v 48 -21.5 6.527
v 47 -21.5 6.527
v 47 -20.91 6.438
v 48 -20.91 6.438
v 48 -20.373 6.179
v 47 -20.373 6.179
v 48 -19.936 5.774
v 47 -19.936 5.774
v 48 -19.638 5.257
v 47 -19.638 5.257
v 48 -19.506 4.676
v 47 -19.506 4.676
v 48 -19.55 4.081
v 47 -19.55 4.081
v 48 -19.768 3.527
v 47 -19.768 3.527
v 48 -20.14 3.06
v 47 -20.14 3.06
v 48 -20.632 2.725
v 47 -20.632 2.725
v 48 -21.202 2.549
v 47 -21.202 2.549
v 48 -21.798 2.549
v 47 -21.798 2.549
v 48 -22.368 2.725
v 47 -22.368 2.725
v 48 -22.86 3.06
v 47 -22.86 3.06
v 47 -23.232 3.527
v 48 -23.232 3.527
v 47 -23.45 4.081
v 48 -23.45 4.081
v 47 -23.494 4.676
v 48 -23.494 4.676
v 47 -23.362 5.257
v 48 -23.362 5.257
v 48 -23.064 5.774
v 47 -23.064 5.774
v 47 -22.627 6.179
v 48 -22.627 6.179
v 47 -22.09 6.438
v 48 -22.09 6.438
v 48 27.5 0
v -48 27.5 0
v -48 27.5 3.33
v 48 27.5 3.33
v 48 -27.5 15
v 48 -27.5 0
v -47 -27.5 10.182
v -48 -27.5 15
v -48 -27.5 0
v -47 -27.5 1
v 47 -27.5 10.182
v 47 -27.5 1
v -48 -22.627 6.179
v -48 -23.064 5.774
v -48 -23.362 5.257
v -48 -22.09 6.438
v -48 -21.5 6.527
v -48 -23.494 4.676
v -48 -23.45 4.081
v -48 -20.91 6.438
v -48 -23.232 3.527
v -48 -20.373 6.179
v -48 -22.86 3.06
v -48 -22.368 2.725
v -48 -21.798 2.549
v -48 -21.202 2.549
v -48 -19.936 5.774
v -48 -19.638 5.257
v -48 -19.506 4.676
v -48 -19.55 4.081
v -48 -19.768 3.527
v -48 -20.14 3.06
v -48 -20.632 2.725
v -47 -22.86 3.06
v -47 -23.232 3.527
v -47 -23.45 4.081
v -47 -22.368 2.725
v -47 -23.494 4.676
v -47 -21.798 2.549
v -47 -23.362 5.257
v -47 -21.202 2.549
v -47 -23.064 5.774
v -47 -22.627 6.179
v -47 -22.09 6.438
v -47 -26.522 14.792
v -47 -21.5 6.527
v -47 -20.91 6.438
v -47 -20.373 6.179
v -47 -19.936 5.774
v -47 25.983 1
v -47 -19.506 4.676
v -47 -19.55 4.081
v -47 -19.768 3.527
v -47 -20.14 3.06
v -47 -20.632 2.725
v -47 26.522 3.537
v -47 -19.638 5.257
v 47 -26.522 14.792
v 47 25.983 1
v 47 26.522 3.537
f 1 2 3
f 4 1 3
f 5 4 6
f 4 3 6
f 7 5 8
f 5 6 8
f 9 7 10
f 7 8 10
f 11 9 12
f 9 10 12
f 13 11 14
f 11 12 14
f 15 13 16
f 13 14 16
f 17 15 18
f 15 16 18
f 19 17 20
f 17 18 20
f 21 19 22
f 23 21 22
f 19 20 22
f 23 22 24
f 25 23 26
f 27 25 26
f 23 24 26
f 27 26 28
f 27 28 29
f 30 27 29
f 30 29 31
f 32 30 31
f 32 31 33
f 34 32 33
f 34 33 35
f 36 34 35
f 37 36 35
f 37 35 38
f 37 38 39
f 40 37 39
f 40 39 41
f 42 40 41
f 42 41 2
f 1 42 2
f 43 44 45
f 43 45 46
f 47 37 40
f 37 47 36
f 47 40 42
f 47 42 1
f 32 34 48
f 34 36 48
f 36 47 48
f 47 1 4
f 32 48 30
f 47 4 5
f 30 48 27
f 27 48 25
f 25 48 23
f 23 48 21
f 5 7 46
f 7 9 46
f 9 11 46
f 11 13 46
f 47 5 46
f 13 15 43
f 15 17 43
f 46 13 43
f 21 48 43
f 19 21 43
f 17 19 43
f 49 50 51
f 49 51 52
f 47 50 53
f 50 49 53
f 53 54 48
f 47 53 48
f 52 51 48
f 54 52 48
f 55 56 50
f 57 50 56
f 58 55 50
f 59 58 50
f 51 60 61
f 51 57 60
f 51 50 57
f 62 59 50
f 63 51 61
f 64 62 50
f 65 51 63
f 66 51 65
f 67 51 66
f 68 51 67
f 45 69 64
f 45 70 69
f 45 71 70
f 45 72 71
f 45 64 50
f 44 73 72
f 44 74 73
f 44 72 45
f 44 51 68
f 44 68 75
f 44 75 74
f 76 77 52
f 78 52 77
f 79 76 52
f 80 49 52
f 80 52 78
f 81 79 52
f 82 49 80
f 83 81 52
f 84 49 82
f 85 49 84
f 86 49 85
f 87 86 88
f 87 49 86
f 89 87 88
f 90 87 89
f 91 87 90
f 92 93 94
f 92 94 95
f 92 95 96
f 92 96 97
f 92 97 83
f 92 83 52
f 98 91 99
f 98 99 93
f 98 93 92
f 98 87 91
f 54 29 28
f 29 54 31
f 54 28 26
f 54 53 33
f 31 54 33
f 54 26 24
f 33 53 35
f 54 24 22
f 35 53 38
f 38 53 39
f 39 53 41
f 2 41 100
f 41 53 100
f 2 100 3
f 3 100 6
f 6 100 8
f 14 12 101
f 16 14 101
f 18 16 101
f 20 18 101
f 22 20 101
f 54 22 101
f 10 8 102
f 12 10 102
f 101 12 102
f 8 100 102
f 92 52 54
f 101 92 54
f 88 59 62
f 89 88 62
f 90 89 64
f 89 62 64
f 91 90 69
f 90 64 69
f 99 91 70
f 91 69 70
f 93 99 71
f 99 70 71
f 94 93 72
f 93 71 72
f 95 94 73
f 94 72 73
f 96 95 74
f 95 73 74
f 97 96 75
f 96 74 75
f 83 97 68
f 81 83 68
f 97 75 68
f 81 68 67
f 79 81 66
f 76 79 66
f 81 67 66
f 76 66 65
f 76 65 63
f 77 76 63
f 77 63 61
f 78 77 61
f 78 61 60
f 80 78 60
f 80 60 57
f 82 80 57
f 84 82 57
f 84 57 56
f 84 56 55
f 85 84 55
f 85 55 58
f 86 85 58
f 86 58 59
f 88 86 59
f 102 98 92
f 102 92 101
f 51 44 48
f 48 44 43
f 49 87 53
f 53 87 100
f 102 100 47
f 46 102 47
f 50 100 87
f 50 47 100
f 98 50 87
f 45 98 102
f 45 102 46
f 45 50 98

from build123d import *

# Parameters (mm, degrees)
CROQUIS1_W                          = 96
CROQUIS1_H                          = 55
SALIENTE_EXTRUIR2_DEPTH             = 15
CORTAR_EXTRUIR1_DEPTH               = 96
CORTAR_EXTRUIR6_REACH               = 17.673
CORTAR_EXTRUIR6_OFFSET_FROM_SURFACE = 1
CROQUIS4_W                          = 94
CROQUIS4_H                          = 54.224485051
CROQUIS5_R                          = 2
CORTAR_EXTRUIR7_DEPTH               = 97


with BuildPart() as part:
    # Croquis1 → Saliente-Extruir2 (new body)
    with BuildSketch(Plane.XY):
        Rectangle(CROQUIS1_W, CROQUIS1_H)
    extrude(amount=SALIENTE_EXTRUIR2_DEPTH)

    # Croquis2 → Cortar-Extruir1 (cut)
    with BuildSketch(Plane.ZY.offset(48)):
        Polygon((3.329836367, 27.5), (15, 27.5), (15, -27.5), align=None)
    extrude(amount=-CORTAR_EXTRUIR1_DEPTH, mode=Mode.SUBTRACT)

    # Cortar-Extruir6: up to this face of the body (flat: up to its plane, moved by the offset)
    cortar_extruir6_end = Plane(part.part.faces().sort_by_distance((0, 0, 0))[0]).offset(-CORTAR_EXTRUIR6_OFFSET_FROM_SURFACE)
    # Croquis4 → Cortar-Extruir6 (cut, up to the picked face)
    with BuildSketch(Plane(origin=(0, 1.860875227, 8.770068758), x_dir=(1, 0, 0), z_dir=(0, 0.207563726, 0.978221498)), mode=Mode.PRIVATE) as cortar_extruir6_sk1:
        with Locations((0, -1.902304571)):
            Rectangle(CROQUIS4_W, CROQUIS4_H)
    cortar_extruir6_tool1 = split(extrude(cortar_extruir6_sk1.sketch, amount=-CORTAR_EXTRUIR6_REACH, mode=Mode.PRIVATE), bisect_by=cortar_extruir6_end, keep=Keep.BOTH, mode=Mode.PRIVATE)
    add(cortar_extruir6_tool1.solids().sort_by_distance((0, 0, 9.164918))[0], mode=Mode.SUBTRACT)

    # Croquis5 → Cortar-Extruir7 (cut, through all)
    with BuildSketch(Plane.ZY.offset(48)):
        with Locations((4.526520959, -21.5)):
            Circle(CROQUIS5_R)
    extrude(amount=-CORTAR_EXTRUIR7_DEPTH, mode=Mode.SUBTRACT)


solid = part.part
